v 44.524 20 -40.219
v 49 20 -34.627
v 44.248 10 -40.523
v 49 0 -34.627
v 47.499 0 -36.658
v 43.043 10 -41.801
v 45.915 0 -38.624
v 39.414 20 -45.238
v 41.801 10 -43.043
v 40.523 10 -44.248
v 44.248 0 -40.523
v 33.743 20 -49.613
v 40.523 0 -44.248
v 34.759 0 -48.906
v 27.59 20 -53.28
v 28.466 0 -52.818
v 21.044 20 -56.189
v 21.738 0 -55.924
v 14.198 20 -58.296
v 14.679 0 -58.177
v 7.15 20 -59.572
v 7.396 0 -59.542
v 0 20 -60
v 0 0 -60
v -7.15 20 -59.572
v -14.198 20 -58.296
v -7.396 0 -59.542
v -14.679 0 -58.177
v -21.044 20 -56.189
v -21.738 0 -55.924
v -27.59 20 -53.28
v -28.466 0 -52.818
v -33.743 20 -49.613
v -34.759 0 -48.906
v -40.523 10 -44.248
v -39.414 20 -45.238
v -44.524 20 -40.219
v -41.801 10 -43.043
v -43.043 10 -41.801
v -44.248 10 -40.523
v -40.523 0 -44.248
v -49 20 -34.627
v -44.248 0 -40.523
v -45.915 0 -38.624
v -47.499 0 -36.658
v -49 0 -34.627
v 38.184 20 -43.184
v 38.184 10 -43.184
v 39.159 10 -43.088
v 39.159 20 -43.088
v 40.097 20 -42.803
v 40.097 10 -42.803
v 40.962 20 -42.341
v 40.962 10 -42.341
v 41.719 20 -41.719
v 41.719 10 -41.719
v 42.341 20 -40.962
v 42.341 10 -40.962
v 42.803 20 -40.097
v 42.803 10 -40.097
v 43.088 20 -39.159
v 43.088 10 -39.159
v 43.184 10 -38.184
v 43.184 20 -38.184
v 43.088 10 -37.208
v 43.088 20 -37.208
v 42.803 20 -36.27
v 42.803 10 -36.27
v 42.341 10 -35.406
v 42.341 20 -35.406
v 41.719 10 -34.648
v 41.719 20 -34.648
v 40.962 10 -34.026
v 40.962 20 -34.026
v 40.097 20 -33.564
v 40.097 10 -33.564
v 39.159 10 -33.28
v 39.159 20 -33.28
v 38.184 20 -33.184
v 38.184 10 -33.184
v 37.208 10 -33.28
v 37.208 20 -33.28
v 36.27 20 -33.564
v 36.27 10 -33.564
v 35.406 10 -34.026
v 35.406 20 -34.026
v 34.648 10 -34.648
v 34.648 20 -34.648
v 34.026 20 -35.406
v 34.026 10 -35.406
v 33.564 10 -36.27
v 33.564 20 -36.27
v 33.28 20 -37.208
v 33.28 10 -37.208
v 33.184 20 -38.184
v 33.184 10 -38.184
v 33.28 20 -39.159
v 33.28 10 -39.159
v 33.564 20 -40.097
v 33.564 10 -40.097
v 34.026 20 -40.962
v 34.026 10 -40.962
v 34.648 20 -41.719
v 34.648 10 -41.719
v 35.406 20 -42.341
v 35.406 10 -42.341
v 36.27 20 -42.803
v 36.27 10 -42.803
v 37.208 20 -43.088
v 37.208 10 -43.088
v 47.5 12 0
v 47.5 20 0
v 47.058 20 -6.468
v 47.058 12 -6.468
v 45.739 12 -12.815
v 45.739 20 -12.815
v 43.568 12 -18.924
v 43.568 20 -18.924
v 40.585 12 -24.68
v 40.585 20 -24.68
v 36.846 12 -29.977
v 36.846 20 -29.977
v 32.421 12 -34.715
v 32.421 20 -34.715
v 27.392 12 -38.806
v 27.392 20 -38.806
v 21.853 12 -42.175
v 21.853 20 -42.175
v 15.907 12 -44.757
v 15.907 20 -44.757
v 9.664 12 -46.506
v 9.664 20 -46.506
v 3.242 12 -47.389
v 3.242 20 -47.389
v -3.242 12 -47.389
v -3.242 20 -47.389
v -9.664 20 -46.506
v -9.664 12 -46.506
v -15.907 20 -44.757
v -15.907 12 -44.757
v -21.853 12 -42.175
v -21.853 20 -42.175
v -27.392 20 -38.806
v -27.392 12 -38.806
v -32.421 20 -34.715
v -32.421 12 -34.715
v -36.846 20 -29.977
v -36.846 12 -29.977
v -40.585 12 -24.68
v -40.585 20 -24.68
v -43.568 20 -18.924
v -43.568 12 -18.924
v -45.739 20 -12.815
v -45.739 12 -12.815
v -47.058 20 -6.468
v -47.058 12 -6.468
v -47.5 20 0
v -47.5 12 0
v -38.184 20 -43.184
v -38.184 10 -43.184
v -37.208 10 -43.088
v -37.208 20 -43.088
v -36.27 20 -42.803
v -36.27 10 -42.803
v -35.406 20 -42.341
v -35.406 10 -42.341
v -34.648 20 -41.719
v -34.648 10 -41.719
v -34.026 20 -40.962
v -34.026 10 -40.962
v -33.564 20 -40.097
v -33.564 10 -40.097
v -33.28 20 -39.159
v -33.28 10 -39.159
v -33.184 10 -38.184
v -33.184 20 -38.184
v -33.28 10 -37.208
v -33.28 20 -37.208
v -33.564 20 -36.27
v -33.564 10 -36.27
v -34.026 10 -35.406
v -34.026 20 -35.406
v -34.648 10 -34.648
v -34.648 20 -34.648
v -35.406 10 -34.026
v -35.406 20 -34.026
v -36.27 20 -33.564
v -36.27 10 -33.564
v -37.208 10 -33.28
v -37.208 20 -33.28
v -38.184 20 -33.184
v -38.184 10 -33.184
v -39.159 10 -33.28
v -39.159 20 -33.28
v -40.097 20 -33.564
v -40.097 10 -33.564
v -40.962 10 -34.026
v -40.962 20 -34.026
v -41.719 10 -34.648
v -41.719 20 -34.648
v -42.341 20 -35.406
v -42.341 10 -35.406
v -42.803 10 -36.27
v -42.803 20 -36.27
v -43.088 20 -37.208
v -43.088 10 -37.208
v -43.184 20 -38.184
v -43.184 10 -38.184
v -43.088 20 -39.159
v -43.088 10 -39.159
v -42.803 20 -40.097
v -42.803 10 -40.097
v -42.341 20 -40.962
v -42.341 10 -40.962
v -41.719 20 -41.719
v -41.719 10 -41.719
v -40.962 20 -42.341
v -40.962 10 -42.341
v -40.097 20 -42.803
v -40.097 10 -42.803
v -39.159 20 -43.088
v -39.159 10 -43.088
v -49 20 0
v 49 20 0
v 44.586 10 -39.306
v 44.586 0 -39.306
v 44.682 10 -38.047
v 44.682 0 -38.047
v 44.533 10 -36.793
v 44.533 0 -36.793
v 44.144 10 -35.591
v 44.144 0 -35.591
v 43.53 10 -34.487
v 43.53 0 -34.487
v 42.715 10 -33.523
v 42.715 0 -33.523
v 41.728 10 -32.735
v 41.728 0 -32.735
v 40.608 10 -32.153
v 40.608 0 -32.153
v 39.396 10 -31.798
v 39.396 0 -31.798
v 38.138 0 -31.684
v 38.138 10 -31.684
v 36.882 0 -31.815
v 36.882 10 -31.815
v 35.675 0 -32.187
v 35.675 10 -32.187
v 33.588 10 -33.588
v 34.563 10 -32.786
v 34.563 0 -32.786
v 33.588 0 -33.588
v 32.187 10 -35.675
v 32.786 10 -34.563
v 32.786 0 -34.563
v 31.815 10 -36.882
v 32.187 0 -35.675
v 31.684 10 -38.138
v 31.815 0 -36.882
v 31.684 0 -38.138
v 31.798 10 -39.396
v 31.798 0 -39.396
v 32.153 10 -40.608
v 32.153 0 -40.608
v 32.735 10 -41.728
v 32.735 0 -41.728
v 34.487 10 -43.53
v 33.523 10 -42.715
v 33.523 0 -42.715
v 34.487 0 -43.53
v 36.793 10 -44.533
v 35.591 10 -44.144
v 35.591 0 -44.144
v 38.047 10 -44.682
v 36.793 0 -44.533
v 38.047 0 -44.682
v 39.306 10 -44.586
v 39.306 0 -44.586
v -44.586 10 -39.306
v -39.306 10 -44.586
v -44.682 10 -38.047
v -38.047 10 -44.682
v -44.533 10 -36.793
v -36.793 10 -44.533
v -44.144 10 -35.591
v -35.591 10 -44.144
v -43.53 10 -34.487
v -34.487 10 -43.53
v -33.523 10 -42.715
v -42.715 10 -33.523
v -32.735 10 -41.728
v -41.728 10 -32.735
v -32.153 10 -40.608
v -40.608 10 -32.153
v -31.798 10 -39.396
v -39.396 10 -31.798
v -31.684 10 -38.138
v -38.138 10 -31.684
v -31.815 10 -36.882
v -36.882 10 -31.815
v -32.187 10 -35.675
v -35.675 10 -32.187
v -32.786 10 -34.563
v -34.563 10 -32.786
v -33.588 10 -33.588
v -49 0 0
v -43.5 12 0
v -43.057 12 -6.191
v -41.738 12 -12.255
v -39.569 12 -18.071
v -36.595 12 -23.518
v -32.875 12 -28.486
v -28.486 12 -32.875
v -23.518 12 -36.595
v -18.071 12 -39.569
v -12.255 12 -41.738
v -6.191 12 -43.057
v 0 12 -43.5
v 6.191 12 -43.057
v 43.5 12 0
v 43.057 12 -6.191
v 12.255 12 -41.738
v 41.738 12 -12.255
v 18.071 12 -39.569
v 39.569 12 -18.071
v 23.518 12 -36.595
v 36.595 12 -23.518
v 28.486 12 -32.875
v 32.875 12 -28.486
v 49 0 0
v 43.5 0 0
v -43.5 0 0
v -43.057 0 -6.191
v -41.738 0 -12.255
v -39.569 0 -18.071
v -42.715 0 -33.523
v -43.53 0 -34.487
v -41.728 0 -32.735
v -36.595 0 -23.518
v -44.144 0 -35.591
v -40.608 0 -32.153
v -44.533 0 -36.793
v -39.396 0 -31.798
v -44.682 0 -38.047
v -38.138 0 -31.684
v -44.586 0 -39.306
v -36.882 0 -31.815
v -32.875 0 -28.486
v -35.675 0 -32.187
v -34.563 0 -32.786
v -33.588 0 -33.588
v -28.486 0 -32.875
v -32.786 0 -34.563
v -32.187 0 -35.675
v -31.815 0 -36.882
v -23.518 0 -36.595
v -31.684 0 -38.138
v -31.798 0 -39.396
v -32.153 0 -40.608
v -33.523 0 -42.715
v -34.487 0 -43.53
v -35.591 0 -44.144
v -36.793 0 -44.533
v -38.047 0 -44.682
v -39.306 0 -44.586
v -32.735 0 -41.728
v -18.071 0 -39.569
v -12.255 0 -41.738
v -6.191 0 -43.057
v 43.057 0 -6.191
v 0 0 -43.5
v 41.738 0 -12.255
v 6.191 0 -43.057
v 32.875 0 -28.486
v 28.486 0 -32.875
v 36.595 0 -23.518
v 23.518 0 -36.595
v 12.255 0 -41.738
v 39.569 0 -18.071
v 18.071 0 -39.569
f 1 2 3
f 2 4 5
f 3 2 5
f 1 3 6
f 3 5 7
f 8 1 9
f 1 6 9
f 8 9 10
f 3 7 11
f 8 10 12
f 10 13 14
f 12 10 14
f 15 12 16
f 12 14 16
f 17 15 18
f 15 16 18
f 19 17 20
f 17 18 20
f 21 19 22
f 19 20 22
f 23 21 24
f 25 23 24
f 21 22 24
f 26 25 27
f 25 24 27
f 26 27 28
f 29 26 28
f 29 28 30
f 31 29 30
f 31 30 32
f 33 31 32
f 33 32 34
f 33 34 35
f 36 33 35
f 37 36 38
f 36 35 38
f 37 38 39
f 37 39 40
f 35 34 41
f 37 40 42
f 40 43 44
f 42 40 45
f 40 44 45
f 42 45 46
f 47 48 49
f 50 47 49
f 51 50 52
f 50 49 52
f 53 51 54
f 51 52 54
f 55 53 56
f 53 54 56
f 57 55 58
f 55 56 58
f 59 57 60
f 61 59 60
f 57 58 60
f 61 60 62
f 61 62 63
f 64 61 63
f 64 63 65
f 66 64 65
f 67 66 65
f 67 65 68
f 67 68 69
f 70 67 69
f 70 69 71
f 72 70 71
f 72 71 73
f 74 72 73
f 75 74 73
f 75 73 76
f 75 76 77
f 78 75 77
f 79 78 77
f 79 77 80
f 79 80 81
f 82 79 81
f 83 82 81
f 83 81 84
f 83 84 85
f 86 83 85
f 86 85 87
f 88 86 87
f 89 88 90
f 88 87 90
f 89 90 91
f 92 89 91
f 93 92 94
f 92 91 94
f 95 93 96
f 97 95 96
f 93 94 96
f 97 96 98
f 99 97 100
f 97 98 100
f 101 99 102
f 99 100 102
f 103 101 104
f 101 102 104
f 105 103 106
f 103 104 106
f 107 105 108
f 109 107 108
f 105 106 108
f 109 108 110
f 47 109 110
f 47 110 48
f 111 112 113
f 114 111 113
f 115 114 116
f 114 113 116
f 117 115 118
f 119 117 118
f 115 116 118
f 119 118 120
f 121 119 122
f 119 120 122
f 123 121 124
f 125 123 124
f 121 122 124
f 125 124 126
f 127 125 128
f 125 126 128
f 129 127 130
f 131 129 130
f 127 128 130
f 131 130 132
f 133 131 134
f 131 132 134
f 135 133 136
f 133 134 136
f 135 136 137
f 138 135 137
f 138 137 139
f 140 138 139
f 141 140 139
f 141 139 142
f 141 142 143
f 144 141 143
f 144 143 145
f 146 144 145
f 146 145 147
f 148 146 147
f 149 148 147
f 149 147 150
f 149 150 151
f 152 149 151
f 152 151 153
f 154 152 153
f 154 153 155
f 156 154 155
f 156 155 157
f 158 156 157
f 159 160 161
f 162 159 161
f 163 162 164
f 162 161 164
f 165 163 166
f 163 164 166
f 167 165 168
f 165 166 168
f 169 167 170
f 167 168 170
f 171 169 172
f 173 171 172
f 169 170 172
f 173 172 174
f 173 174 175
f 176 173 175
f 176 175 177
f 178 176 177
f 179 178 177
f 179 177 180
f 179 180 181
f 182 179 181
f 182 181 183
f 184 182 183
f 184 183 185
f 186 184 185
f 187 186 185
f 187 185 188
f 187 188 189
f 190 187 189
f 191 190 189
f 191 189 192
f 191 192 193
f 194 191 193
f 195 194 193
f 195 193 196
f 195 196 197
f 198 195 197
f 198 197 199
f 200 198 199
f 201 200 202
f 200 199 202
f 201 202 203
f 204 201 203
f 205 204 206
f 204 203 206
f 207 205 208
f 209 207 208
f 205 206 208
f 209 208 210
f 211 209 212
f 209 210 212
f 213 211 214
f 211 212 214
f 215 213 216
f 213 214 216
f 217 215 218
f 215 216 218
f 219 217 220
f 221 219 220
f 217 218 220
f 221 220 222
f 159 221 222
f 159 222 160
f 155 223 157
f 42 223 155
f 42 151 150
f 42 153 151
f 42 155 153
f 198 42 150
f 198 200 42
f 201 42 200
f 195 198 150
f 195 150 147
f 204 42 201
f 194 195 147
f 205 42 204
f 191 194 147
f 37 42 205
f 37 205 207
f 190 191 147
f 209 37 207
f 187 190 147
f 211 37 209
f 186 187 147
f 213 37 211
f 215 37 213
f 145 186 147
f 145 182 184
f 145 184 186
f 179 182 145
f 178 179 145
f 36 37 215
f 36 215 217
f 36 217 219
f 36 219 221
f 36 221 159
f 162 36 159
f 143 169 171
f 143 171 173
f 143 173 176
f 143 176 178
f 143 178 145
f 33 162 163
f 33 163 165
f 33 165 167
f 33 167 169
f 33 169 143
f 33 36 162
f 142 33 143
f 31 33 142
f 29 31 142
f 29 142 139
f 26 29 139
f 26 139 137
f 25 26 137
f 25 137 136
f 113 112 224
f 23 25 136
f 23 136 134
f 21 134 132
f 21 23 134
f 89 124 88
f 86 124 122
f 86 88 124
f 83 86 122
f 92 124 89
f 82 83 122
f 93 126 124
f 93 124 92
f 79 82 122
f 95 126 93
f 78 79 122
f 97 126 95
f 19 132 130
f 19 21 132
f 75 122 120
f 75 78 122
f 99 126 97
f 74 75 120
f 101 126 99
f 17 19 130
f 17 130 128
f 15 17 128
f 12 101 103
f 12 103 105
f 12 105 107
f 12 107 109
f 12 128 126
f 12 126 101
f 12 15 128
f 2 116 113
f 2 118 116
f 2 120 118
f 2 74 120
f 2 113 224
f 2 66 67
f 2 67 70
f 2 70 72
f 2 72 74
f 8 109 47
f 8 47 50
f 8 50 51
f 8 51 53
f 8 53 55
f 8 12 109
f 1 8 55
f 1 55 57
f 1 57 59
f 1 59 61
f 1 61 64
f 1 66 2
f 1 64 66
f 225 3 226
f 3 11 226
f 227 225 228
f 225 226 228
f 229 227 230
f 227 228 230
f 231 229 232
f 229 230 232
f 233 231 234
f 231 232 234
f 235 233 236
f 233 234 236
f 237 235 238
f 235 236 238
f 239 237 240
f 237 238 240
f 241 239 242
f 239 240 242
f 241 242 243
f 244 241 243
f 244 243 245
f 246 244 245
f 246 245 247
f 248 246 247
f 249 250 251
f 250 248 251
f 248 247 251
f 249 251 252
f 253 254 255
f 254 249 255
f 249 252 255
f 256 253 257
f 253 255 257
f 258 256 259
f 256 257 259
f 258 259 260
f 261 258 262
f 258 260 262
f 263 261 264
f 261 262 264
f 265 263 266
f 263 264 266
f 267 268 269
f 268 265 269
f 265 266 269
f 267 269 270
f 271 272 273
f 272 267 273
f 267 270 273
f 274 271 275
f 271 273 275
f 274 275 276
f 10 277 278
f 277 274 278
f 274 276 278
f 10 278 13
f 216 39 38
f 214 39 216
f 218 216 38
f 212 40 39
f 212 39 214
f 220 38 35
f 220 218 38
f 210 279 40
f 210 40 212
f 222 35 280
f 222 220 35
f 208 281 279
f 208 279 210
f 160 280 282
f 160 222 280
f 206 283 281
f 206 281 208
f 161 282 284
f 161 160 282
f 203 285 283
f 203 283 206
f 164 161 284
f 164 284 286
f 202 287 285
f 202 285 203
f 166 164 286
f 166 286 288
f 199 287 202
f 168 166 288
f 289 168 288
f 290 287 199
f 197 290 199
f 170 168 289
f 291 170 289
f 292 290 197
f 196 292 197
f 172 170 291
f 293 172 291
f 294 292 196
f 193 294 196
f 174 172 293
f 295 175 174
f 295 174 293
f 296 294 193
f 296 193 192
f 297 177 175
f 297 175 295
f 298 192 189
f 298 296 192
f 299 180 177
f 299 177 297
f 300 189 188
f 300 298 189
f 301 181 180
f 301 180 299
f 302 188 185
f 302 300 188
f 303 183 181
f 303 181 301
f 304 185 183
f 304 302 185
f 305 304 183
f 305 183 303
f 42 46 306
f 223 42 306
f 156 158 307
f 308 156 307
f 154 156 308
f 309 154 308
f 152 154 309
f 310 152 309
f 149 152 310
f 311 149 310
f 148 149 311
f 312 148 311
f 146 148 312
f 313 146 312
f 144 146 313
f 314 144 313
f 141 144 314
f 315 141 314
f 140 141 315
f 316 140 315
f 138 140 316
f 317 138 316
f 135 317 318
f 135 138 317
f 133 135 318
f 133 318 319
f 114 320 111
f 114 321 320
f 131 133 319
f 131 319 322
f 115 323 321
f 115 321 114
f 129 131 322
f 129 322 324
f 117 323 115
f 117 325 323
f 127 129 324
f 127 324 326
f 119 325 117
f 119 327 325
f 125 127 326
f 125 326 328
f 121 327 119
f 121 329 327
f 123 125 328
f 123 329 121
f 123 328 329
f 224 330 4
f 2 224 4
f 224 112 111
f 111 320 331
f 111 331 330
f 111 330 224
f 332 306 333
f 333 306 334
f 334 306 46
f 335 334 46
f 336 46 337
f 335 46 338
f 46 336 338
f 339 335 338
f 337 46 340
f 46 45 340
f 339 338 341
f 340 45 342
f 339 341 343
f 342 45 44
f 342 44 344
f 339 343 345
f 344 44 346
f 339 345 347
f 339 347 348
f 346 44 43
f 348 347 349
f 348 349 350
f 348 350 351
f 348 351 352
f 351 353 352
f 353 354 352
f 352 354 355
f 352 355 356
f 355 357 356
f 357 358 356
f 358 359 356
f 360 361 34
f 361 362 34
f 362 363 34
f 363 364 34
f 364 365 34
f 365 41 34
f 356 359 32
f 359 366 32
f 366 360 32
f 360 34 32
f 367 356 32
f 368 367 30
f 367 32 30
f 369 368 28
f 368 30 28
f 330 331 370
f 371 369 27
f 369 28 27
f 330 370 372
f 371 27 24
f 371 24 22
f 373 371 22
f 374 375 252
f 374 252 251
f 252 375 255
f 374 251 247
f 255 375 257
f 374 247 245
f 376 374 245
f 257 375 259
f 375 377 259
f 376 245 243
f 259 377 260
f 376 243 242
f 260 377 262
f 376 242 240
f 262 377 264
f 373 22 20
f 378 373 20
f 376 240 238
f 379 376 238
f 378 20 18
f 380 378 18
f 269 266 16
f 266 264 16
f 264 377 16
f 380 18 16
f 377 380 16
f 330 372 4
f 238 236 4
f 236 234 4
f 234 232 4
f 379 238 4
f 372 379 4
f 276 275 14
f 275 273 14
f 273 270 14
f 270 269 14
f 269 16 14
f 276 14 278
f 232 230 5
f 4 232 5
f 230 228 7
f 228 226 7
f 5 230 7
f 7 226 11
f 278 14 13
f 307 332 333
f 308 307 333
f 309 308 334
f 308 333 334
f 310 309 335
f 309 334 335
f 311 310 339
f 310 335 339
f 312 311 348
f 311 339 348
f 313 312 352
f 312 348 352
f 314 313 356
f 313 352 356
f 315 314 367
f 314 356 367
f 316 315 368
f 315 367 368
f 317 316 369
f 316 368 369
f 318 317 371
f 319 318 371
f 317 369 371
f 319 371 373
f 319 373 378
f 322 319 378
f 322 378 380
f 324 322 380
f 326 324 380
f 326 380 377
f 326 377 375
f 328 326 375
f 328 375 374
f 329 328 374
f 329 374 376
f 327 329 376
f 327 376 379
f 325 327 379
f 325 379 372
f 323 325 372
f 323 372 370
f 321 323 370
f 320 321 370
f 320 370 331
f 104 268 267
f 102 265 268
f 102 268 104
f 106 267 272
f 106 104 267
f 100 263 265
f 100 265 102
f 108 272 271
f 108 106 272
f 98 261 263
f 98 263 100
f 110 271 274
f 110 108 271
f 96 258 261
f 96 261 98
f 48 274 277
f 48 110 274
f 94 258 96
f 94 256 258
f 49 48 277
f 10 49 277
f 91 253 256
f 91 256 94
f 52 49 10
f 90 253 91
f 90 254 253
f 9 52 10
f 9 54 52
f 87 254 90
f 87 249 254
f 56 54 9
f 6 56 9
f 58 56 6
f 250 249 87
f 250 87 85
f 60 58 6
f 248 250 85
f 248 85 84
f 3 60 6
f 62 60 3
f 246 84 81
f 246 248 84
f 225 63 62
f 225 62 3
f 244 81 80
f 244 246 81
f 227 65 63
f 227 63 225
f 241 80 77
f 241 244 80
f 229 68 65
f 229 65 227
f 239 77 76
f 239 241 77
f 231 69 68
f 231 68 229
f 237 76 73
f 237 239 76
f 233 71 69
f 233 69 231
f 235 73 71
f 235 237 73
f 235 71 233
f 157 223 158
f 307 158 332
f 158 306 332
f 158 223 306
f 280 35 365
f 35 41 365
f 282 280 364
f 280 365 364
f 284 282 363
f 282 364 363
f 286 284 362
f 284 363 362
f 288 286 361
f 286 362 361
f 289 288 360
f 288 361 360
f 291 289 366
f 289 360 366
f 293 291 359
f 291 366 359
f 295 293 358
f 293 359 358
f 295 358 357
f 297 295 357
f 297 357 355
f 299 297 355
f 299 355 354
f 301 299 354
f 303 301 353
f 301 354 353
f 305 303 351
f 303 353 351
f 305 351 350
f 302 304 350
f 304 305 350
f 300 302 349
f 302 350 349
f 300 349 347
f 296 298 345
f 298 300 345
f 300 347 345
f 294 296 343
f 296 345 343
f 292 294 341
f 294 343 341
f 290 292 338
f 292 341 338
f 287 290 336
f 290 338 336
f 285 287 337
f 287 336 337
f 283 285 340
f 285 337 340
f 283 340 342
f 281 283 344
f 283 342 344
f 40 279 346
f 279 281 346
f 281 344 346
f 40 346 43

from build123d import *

# Parameters (mm, degrees)
BOSS_EXTRUDE1_DEPTH = 20
SKETCH2_R           = 43.5
CUT_EXTRUDE2_DEPTH  = 81.006249756
SKETCH3_R           = 47.5
CUT_EXTRUDE3_DEPTH  = 8
SKETCH4_R           = 6.5
CUT_EXTRUDE4_DEPTH  = 10
SKETCH4_3_R         = 5
CUT_EXTRUDE6_DEPTH  = 81.006249756


with BuildPart() as part:
    # Sketch1 → Boss-Extrude1 (new body)
    with BuildSketch(Plane(origin=(0, 0, 0), x_dir=(1, 0, 0), z_dir=(0, 1, 0))):
        with BuildLine():
            Line((-49, 34.626579386), (-49, 0))
            Line((-49, 0), (49, 0))
            Line((49, 0), (49, 34.626579386))
            ThreePointArc((49, 34.626579386), (0, 60), (-49, 34.626579386))
        make_face()
    extrude(amount=BOSS_EXTRUDE1_DEPTH)

    # Sketch2 → Cut-Extrude2 (cut, through all)
    with BuildSketch(Plane.XZ):
        Circle(SKETCH2_R)
    extrude(amount=-CUT_EXTRUDE2_DEPTH, mode=Mode.SUBTRACT)

    # Sketch3 → Cut-Extrude3 (cut)
    with BuildSketch(Plane(origin=(0, 20, 0), x_dir=(1, 0, 0), z_dir=(0, 1, 0))):
        Circle(SKETCH3_R)
    extrude(amount=-CUT_EXTRUDE3_DEPTH, mode=Mode.SUBTRACT)

    # Sketch4 → Cut-Extrude4 (cut)
    with BuildSketch(Plane.XZ):
        with Locations((-38.183766184, 38.183766184)):
            Circle(SKETCH4_R)
        with Locations((38.183766184, 38.183766184)):
            Circle(SKETCH4_R)
        with Locations((38.183766184, -38.183766184)):
            Circle(SKETCH4_R)
        with Locations((-38.183766184, -38.183766184)):
            Circle(SKETCH4_R)
    extrude(amount=-CUT_EXTRUDE4_DEPTH, mode=Mode.SUBTRACT)

    # Sketch4<3> → Cut-Extrude6 (cut, through all)
    with BuildSketch(Plane.XZ):
        with Locations((-38.183766184, 38.183766184)):
            Circle(SKETCH4_3_R)
        with Locations((38.183766184, 38.183766184)):
            Circle(SKETCH4_3_R)
        with Locations((38.183766184, -38.183766184)):
            Circle(SKETCH4_3_R)
        with Locations((-38.183766184, -38.183766184)):
            Circle(SKETCH4_3_R)
    extrude(amount=-CUT_EXTRUDE6_DEPTH, mode=Mode.SUBTRACT)


solid = part.part
